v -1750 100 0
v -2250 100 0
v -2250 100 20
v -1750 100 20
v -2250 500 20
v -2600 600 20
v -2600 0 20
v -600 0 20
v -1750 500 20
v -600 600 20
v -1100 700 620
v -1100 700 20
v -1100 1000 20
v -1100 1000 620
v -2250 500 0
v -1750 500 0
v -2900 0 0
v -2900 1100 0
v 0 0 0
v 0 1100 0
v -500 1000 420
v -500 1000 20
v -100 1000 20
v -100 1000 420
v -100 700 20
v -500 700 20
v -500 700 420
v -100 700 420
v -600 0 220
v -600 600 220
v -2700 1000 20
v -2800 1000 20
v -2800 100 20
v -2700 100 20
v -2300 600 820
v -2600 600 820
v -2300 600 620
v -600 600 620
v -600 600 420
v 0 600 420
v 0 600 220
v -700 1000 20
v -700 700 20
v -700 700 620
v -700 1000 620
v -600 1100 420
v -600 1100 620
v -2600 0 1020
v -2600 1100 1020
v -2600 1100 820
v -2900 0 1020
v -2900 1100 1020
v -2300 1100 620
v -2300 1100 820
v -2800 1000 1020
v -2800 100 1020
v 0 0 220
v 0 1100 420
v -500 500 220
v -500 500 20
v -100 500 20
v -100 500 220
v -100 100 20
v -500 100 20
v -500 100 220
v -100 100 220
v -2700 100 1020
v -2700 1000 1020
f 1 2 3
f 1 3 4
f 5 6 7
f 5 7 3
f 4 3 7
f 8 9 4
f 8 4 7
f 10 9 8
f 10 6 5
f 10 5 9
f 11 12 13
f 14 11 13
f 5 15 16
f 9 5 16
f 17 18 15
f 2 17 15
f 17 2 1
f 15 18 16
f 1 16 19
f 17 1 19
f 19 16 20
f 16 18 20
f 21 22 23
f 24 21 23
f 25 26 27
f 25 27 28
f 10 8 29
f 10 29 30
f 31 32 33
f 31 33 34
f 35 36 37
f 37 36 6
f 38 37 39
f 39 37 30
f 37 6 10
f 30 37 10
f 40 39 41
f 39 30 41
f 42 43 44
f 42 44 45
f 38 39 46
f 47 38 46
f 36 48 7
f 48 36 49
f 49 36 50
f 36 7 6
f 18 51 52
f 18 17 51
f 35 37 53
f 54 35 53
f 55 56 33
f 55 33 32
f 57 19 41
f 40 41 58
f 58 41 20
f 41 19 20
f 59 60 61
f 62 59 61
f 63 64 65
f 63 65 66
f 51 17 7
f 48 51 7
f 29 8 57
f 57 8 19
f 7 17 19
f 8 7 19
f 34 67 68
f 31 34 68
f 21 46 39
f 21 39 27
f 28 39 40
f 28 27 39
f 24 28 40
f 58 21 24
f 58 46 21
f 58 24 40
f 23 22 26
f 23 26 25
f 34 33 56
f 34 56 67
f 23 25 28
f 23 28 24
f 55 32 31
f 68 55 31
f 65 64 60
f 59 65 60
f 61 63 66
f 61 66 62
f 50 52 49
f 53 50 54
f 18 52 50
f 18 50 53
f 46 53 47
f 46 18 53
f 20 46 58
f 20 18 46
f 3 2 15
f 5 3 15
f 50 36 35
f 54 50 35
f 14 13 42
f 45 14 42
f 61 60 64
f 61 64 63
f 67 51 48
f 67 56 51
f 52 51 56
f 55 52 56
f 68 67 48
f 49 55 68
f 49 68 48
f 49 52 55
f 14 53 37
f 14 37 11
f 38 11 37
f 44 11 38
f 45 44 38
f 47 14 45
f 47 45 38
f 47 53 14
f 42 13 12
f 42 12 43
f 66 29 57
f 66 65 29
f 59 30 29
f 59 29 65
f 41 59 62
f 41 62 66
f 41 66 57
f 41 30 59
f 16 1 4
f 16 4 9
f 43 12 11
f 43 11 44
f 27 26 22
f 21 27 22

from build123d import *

# Parameters (mm, degrees)
F0_W      = 500
F0_H      = 400
F1_DEPTH  = 20
F2_W      = 600
F2_H      = 500
F2_W_2    = 400
F2_H_2    = 300
F3_DEPTH  = 400
F4_W      = 1700
F4_H      = 500
F4_W_2    = 400
F4_H_2    = 300
F5_DEPTH  = 600
F6_W      = 300
F6_H      = 500
F7_DEPTH  = 800
F8_W      = 300
F8_H      = 1100
F8_W_2    = 100
F8_H_2    = 900
F9_DEPTH  = 1000
F10_W     = 600
F10_H     = 600
F10_W_2   = 400
F10_H_2   = 400
F11_DEPTH = 200


with BuildPart() as f1:
    # F0 (on Top) → F1 (new body)
    with BuildSketch(Plane.XY):
        Polygon((-2350, 0), (0, 0), (0, 1100), (-2900, 1100), (-2900, 0), align=None)
        with Locations((-2000, 300)):
            Rectangle(F0_W, F0_H, mode=Mode.SUBTRACT)
    extrude(amount=F1_DEPTH)

    # F2 (on face) → F3 (join)
    with BuildSketch(Plane.XY.offset(20)):
        with Locations((-300, 850)):
            Rectangle(F2_W, F2_H)
        with Locations((-300, 850)):
            Rectangle(F2_W_2, F2_H_2, mode=Mode.SUBTRACT)
    extrude(amount=F3_DEPTH)

    # F4 (on face) → F5 (join)
    with BuildSketch(Plane.XY.offset(20)):
        with Locations((-1450, 850)):
            Rectangle(F4_W, F4_H)
        with Locations((-900, 850)):
            Rectangle(F4_W_2, F4_H_2, mode=Mode.SUBTRACT)
    extrude(amount=F5_DEPTH)

    # F6 (on face) → F7 (join)
    with BuildSketch(Plane.XY.offset(20)):
        with Locations((-2450, 850)):
            Rectangle(F6_W, F6_H)
    extrude(amount=F7_DEPTH)

    # F8 (on face) → F9 (join)
    with BuildSketch(Plane.XY.offset(20)):
        with Locations((-2750, 550)):
            Rectangle(F8_W, F8_H)
        with Locations((-2750, 550)):
            Rectangle(F8_W_2, F8_H_2, mode=Mode.SUBTRACT)
    extrude(amount=F9_DEPTH)

    # F10 (on face) → F11 (join)
    with BuildSketch(Plane.XY.offset(20)):
        with Locations((-300, 300)):
            Rectangle(F10_W, F10_H)
        with Locations((-300, 300)):
            Rectangle(F10_W_2, F10_H_2, mode=Mode.SUBTRACT)
    extrude(amount=F11_DEPTH)


solid = f1.part
